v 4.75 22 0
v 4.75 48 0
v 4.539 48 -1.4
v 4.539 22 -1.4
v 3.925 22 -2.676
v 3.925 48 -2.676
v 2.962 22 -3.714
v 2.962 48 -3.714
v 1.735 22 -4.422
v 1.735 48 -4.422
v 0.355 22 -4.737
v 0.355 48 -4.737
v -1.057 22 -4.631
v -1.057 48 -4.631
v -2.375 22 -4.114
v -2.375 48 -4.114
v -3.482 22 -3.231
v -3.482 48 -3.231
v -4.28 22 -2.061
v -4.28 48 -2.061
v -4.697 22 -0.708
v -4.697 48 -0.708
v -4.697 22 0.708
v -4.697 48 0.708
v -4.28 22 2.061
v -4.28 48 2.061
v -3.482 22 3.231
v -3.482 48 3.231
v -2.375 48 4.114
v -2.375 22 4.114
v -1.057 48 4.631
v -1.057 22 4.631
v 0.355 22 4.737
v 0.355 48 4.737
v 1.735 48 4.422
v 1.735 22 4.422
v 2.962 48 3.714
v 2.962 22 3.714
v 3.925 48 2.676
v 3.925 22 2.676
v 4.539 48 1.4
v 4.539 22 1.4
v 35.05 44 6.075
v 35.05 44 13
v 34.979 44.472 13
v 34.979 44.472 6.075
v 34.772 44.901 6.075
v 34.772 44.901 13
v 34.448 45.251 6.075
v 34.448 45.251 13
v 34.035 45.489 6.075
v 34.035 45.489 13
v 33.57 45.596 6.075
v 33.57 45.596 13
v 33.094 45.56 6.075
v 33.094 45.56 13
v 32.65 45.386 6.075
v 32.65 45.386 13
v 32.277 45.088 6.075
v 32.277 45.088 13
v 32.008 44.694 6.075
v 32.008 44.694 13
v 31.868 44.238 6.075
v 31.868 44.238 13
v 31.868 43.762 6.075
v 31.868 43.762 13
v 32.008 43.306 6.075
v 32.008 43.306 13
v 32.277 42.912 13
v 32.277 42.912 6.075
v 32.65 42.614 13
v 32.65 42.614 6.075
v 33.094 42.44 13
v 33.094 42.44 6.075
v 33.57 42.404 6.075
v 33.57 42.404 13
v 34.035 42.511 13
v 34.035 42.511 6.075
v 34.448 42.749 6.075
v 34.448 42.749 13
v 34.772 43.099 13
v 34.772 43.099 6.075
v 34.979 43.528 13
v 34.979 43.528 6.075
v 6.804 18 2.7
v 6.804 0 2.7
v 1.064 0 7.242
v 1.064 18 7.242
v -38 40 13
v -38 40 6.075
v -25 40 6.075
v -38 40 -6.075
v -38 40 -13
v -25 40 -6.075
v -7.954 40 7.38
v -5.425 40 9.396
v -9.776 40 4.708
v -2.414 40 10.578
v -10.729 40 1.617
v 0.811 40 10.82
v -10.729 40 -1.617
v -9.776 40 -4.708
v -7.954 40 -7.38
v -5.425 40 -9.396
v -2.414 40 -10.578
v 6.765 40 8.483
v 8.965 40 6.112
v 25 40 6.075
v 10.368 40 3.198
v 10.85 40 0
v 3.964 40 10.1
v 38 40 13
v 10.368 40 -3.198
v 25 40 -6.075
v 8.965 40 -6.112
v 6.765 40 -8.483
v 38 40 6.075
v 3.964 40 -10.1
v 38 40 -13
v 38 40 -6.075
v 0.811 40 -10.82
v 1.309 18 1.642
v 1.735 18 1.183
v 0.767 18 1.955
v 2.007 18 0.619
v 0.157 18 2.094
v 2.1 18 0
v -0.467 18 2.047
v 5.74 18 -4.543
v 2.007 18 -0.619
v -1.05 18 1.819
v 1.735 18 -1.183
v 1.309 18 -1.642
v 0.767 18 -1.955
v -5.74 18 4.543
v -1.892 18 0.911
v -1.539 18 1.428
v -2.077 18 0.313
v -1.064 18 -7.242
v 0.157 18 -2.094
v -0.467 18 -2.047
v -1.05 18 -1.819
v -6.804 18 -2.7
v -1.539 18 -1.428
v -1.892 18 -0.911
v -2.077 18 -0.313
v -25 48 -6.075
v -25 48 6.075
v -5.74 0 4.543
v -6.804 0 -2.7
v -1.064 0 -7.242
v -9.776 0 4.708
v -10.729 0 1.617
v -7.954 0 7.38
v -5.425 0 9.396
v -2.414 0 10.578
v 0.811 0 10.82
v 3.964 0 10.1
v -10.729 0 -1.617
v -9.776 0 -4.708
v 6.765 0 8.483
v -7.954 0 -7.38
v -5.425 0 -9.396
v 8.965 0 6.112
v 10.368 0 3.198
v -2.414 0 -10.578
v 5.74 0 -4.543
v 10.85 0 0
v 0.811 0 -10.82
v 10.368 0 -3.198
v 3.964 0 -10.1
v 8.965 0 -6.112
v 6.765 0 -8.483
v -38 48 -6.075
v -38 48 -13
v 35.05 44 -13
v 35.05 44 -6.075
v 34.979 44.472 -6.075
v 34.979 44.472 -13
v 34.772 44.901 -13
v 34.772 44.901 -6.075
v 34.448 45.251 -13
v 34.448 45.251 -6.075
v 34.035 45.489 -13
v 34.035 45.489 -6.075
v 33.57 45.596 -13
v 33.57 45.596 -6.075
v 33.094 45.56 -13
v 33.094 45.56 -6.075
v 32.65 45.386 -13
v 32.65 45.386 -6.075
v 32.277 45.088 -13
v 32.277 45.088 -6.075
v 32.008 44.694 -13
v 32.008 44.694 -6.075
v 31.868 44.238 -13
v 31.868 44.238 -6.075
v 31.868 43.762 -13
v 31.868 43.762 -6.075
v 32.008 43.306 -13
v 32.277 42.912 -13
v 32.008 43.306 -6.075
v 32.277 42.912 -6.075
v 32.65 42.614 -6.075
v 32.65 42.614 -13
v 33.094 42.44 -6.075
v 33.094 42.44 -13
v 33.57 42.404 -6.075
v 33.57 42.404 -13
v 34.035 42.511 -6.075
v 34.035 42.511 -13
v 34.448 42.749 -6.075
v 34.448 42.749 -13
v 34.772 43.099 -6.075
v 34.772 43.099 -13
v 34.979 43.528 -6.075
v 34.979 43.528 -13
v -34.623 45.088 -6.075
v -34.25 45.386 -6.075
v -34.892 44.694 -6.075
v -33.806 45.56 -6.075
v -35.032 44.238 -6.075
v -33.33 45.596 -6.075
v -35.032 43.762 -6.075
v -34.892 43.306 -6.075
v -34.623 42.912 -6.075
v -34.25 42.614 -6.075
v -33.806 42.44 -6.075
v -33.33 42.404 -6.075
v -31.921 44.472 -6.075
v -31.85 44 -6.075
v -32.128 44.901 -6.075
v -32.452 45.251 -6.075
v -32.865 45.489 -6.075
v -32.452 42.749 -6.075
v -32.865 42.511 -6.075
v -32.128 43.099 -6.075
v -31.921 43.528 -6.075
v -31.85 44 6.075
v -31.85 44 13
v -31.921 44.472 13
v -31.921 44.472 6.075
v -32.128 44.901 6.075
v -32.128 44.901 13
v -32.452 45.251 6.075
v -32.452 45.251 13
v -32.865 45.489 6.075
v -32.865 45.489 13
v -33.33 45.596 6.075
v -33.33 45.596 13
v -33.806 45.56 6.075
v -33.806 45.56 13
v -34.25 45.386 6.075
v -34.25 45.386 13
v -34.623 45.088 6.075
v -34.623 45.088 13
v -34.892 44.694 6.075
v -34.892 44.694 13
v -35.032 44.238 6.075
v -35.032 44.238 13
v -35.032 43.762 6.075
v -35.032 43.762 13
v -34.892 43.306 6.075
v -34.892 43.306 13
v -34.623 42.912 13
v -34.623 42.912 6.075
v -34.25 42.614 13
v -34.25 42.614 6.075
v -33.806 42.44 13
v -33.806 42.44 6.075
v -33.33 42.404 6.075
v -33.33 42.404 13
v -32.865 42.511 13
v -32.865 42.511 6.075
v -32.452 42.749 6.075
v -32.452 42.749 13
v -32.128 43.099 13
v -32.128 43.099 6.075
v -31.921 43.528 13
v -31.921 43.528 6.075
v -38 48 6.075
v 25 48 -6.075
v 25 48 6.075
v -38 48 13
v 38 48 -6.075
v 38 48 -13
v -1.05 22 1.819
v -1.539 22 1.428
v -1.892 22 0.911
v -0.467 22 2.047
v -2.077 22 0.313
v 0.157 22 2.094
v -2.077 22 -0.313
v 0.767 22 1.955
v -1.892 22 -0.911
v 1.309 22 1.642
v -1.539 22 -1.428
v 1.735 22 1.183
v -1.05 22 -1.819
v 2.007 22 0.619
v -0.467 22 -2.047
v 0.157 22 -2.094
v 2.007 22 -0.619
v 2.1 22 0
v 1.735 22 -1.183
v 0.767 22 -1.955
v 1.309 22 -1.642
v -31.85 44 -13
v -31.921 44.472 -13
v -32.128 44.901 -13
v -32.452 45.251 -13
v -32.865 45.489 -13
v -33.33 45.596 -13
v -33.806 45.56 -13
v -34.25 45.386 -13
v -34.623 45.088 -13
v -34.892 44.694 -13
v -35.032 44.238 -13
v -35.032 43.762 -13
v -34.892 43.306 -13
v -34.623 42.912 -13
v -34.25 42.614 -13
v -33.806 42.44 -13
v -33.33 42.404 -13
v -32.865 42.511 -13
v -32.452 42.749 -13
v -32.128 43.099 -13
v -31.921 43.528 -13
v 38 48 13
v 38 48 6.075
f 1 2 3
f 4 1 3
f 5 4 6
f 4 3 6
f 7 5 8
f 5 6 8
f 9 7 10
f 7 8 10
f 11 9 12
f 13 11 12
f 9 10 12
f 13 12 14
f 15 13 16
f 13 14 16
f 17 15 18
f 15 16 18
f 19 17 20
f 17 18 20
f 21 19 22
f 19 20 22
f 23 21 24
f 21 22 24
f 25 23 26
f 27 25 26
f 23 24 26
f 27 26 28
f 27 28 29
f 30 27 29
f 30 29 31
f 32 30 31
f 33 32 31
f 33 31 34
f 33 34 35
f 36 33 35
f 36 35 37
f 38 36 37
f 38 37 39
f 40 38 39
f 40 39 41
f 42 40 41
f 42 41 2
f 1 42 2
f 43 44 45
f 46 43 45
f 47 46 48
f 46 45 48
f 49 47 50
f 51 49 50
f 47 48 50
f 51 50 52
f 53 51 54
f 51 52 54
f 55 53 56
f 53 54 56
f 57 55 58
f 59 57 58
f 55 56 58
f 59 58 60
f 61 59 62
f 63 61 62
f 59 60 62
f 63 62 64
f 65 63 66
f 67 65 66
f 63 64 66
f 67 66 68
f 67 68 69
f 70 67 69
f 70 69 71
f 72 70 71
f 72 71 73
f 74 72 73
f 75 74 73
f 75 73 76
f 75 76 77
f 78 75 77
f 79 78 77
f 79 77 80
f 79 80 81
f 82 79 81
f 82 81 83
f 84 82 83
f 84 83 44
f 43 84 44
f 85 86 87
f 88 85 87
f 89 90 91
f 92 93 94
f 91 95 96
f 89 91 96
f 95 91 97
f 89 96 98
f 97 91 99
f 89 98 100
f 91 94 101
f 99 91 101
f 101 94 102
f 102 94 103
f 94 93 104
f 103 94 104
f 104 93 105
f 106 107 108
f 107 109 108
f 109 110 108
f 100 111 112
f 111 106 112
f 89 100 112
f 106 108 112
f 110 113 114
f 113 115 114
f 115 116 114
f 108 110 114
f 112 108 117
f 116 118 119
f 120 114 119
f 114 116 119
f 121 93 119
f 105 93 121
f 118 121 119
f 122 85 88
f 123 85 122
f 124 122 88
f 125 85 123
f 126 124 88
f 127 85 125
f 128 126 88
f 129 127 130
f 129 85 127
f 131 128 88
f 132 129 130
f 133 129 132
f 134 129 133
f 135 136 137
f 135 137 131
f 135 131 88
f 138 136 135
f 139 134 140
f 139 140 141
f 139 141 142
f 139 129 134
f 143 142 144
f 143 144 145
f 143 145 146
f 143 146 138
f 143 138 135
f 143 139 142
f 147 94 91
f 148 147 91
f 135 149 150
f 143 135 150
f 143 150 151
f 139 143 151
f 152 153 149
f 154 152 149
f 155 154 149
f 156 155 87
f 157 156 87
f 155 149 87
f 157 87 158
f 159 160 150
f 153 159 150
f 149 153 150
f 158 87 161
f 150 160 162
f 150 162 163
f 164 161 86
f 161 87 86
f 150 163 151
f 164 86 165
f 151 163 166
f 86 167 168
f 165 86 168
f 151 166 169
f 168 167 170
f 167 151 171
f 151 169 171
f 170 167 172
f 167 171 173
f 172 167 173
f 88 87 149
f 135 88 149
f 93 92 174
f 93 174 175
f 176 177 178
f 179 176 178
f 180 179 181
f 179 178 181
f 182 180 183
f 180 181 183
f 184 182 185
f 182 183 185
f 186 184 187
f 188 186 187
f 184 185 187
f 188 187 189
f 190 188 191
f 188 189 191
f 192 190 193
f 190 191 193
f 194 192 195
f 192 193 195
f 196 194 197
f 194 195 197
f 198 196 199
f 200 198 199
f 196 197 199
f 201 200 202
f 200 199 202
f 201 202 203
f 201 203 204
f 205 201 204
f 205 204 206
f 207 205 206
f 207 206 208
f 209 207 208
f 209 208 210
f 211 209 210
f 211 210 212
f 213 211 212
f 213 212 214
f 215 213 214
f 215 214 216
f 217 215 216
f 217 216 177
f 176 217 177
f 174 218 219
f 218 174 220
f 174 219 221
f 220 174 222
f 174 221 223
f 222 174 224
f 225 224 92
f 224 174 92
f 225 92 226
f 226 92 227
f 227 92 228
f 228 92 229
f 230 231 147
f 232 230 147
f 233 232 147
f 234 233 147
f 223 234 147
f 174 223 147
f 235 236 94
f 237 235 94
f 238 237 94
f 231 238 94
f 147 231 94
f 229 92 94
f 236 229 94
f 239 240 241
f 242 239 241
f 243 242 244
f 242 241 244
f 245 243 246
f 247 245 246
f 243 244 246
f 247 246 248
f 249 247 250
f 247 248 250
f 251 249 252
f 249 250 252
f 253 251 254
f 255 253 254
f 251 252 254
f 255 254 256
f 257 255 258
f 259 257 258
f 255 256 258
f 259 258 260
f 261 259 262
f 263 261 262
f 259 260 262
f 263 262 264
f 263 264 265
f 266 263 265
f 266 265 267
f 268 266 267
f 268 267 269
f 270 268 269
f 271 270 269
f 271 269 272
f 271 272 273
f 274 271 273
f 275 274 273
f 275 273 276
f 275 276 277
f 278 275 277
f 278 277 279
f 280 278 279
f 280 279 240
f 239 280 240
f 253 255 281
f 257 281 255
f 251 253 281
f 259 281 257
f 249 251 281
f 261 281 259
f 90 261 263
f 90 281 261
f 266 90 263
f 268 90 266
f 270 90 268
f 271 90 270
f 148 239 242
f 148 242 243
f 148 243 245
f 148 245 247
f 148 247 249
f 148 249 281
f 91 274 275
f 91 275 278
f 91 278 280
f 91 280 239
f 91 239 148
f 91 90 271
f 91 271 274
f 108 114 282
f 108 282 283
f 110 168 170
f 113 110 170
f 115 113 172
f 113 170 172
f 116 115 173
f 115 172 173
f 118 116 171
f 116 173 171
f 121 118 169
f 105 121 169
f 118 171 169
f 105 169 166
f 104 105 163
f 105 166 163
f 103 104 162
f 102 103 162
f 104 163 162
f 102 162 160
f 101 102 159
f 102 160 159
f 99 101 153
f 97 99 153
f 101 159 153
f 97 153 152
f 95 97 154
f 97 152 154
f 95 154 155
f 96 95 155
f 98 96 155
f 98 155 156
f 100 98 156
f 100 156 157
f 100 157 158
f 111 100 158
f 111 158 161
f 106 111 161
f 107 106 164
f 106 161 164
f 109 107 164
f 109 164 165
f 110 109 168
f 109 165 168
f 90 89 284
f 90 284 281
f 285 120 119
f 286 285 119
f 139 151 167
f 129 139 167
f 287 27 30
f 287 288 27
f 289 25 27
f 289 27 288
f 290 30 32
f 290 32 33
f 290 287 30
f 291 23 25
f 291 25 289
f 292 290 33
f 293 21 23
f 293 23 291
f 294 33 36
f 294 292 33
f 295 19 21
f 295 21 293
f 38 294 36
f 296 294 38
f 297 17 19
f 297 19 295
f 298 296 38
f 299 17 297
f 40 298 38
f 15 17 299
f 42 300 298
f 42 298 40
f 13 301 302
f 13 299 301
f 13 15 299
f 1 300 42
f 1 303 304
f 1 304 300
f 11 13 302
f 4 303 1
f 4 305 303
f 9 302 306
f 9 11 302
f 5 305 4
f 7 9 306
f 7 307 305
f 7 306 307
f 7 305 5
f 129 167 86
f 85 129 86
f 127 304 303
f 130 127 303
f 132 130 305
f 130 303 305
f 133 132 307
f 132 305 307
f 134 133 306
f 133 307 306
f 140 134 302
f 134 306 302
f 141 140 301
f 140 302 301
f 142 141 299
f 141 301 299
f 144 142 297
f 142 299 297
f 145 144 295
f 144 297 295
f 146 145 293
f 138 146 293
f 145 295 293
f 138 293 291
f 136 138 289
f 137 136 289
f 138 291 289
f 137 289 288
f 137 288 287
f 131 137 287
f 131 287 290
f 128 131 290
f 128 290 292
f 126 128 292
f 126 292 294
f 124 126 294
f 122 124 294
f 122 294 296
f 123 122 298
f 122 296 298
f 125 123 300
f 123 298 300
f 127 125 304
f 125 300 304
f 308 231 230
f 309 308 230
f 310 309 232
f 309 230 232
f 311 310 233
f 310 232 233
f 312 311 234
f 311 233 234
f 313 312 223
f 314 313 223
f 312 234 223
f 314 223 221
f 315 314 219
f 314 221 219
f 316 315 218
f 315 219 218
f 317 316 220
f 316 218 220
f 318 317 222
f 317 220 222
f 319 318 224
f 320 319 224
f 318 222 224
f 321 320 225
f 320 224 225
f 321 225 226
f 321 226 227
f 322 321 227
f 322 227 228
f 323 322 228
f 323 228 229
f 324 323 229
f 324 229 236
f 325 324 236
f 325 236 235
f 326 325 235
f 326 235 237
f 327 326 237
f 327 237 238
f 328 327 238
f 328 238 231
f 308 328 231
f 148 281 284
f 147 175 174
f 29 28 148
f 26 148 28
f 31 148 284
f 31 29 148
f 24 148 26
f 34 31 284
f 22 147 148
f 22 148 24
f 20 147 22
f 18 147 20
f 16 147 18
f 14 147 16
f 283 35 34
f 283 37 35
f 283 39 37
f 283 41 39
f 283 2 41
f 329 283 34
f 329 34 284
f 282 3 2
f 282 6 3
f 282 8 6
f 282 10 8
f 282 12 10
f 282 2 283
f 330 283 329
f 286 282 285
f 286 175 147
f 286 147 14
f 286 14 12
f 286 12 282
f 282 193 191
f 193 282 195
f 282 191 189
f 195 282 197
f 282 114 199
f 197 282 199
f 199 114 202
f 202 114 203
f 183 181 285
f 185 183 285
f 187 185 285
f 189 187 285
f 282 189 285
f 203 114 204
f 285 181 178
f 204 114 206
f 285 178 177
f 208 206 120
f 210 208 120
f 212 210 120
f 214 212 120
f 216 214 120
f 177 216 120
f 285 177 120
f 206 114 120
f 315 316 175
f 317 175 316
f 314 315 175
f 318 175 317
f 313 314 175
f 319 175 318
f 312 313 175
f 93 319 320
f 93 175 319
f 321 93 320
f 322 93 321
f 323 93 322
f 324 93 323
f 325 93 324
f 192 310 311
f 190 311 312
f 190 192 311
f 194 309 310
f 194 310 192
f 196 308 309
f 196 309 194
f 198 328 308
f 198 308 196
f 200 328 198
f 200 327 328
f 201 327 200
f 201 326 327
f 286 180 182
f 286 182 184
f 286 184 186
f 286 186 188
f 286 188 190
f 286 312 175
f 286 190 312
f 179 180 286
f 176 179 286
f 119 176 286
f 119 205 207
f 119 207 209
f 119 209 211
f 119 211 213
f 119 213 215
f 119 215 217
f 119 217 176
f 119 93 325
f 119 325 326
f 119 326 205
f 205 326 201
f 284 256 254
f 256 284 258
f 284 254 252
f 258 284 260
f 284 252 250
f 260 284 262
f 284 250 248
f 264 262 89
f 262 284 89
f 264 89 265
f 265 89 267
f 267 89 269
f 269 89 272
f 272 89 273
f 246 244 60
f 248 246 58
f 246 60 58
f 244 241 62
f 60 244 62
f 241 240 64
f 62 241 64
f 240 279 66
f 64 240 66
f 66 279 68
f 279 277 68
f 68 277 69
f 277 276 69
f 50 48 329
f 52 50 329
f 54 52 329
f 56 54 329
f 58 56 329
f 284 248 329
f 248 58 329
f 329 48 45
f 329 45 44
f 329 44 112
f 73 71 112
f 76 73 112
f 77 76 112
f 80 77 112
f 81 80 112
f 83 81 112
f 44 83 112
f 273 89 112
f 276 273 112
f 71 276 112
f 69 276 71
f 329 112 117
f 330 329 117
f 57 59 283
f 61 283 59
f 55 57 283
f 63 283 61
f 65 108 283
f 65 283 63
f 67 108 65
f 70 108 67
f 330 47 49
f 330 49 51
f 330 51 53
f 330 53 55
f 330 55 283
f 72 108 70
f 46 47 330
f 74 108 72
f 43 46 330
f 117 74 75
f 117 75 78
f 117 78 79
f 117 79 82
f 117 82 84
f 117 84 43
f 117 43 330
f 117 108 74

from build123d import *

# Parameters (mm, degrees)
SKETCH_10_R         = 10.85
EXTRUDE_5_DEPTH     = 40
CUT_EXTRUDE_1_DEPTH = 18
SKETCH_12_R         = 4.75
CUT_EXTRUDE_2_DEPTH = 18
SKETCH_13_R         = 2.1
CUT_EXTRUDE_3_DEPTH = 4
SKETCH_14_W         = 76
SKETCH_14_H         = 26
EXTRUDE_8_DEPTH     = 8
SKETCH_15_R         = 4.75
CUT_EXTRUDE_4_DEPTH = 8
SKETCH_16_R         = 1.6
CUT_EXTRUDE_5_DEPTH = 26
SKETCH_17_W         = 13
SKETCH_17_H         = 12.15
CUT_EXTRUDE_6_DEPTH = 8


with BuildPart() as part:
    # 草图10 → 凸台-拉伸5 (new body)
    with BuildSketch(Plane(origin=(0, 0, 0), x_dir=(1, 0, 0), z_dir=(0, 1, 0))):
        Circle(SKETCH_10_R)
    extrude(amount=EXTRUDE_5_DEPTH)

    # 草图11 → 切除-拉伸1 (cut)
    with BuildSketch(Plane(origin=(0, 0, 0), x_dir=(-1, 0, 0), z_dir=(0, -1, 0))):
        Polygon((5.739953665, -4.542612896), (6.803995, 2.699639243), (1.064041335, 7.242252139), (-5.739953665, 4.542612896), (-6.803995, -2.699639243), (-1.064041335, -7.242252139), align=None)
    extrude(amount=-CUT_EXTRUDE_1_DEPTH, mode=Mode.SUBTRACT)

    # 草图12 → 切除-拉伸2 (cut)
    with BuildSketch(Plane(origin=(0, 40, 0), x_dir=(1, 0, 0), z_dir=(0, 1, 0))):
        Circle(SKETCH_12_R)
    extrude(amount=-CUT_EXTRUDE_2_DEPTH, mode=Mode.SUBTRACT)

    # 草图13 → 切除-拉伸3 (cut)
    with BuildSketch(Plane(origin=(0, 22, 0), x_dir=(1, 0, 0), z_dir=(0, 1, 0))):
        Circle(SKETCH_13_R)
    extrude(amount=-CUT_EXTRUDE_3_DEPTH, mode=Mode.SUBTRACT)

    # 草图14 → 凸台-拉伸8 (add)
    with BuildSketch(Plane(origin=(0, 40, 0), x_dir=(1, 0, 0), z_dir=(0, 1, 0))):
        Rectangle(SKETCH_14_W, SKETCH_14_H)
    extrude(amount=EXTRUDE_8_DEPTH)

    # 草图15 → 切除-拉伸4 (cut)
    with BuildSketch(Plane(origin=(0, 48, 0), x_dir=(1, 0, 0), z_dir=(0, 1, 0))):
        Circle(SKETCH_15_R)
    extrude(amount=-CUT_EXTRUDE_4_DEPTH, mode=Mode.SUBTRACT)

    # 草图16 → 切除-拉伸5 (cut)
    with BuildSketch(Plane.XY.offset(13)):
        with Locations((-33.45, 44)):
            Circle(SKETCH_16_R)
        with Locations((33.45, 44)):
            Circle(SKETCH_16_R)
    extrude(amount=-CUT_EXTRUDE_5_DEPTH, mode=Mode.SUBTRACT)

    # 草图17 → 切除-拉伸6 (cut)
    with BuildSketch(Plane.XZ.offset(-40)):
        with Locations((31.5, 0)):
            Rectangle(SKETCH_17_W, SKETCH_17_H)
        with Locations((-31.5, 0)):
            Rectangle(SKETCH_17_W, SKETCH_17_H)
    extrude(amount=-CUT_EXTRUDE_6_DEPTH, mode=Mode.SUBTRACT)


solid = part.part
